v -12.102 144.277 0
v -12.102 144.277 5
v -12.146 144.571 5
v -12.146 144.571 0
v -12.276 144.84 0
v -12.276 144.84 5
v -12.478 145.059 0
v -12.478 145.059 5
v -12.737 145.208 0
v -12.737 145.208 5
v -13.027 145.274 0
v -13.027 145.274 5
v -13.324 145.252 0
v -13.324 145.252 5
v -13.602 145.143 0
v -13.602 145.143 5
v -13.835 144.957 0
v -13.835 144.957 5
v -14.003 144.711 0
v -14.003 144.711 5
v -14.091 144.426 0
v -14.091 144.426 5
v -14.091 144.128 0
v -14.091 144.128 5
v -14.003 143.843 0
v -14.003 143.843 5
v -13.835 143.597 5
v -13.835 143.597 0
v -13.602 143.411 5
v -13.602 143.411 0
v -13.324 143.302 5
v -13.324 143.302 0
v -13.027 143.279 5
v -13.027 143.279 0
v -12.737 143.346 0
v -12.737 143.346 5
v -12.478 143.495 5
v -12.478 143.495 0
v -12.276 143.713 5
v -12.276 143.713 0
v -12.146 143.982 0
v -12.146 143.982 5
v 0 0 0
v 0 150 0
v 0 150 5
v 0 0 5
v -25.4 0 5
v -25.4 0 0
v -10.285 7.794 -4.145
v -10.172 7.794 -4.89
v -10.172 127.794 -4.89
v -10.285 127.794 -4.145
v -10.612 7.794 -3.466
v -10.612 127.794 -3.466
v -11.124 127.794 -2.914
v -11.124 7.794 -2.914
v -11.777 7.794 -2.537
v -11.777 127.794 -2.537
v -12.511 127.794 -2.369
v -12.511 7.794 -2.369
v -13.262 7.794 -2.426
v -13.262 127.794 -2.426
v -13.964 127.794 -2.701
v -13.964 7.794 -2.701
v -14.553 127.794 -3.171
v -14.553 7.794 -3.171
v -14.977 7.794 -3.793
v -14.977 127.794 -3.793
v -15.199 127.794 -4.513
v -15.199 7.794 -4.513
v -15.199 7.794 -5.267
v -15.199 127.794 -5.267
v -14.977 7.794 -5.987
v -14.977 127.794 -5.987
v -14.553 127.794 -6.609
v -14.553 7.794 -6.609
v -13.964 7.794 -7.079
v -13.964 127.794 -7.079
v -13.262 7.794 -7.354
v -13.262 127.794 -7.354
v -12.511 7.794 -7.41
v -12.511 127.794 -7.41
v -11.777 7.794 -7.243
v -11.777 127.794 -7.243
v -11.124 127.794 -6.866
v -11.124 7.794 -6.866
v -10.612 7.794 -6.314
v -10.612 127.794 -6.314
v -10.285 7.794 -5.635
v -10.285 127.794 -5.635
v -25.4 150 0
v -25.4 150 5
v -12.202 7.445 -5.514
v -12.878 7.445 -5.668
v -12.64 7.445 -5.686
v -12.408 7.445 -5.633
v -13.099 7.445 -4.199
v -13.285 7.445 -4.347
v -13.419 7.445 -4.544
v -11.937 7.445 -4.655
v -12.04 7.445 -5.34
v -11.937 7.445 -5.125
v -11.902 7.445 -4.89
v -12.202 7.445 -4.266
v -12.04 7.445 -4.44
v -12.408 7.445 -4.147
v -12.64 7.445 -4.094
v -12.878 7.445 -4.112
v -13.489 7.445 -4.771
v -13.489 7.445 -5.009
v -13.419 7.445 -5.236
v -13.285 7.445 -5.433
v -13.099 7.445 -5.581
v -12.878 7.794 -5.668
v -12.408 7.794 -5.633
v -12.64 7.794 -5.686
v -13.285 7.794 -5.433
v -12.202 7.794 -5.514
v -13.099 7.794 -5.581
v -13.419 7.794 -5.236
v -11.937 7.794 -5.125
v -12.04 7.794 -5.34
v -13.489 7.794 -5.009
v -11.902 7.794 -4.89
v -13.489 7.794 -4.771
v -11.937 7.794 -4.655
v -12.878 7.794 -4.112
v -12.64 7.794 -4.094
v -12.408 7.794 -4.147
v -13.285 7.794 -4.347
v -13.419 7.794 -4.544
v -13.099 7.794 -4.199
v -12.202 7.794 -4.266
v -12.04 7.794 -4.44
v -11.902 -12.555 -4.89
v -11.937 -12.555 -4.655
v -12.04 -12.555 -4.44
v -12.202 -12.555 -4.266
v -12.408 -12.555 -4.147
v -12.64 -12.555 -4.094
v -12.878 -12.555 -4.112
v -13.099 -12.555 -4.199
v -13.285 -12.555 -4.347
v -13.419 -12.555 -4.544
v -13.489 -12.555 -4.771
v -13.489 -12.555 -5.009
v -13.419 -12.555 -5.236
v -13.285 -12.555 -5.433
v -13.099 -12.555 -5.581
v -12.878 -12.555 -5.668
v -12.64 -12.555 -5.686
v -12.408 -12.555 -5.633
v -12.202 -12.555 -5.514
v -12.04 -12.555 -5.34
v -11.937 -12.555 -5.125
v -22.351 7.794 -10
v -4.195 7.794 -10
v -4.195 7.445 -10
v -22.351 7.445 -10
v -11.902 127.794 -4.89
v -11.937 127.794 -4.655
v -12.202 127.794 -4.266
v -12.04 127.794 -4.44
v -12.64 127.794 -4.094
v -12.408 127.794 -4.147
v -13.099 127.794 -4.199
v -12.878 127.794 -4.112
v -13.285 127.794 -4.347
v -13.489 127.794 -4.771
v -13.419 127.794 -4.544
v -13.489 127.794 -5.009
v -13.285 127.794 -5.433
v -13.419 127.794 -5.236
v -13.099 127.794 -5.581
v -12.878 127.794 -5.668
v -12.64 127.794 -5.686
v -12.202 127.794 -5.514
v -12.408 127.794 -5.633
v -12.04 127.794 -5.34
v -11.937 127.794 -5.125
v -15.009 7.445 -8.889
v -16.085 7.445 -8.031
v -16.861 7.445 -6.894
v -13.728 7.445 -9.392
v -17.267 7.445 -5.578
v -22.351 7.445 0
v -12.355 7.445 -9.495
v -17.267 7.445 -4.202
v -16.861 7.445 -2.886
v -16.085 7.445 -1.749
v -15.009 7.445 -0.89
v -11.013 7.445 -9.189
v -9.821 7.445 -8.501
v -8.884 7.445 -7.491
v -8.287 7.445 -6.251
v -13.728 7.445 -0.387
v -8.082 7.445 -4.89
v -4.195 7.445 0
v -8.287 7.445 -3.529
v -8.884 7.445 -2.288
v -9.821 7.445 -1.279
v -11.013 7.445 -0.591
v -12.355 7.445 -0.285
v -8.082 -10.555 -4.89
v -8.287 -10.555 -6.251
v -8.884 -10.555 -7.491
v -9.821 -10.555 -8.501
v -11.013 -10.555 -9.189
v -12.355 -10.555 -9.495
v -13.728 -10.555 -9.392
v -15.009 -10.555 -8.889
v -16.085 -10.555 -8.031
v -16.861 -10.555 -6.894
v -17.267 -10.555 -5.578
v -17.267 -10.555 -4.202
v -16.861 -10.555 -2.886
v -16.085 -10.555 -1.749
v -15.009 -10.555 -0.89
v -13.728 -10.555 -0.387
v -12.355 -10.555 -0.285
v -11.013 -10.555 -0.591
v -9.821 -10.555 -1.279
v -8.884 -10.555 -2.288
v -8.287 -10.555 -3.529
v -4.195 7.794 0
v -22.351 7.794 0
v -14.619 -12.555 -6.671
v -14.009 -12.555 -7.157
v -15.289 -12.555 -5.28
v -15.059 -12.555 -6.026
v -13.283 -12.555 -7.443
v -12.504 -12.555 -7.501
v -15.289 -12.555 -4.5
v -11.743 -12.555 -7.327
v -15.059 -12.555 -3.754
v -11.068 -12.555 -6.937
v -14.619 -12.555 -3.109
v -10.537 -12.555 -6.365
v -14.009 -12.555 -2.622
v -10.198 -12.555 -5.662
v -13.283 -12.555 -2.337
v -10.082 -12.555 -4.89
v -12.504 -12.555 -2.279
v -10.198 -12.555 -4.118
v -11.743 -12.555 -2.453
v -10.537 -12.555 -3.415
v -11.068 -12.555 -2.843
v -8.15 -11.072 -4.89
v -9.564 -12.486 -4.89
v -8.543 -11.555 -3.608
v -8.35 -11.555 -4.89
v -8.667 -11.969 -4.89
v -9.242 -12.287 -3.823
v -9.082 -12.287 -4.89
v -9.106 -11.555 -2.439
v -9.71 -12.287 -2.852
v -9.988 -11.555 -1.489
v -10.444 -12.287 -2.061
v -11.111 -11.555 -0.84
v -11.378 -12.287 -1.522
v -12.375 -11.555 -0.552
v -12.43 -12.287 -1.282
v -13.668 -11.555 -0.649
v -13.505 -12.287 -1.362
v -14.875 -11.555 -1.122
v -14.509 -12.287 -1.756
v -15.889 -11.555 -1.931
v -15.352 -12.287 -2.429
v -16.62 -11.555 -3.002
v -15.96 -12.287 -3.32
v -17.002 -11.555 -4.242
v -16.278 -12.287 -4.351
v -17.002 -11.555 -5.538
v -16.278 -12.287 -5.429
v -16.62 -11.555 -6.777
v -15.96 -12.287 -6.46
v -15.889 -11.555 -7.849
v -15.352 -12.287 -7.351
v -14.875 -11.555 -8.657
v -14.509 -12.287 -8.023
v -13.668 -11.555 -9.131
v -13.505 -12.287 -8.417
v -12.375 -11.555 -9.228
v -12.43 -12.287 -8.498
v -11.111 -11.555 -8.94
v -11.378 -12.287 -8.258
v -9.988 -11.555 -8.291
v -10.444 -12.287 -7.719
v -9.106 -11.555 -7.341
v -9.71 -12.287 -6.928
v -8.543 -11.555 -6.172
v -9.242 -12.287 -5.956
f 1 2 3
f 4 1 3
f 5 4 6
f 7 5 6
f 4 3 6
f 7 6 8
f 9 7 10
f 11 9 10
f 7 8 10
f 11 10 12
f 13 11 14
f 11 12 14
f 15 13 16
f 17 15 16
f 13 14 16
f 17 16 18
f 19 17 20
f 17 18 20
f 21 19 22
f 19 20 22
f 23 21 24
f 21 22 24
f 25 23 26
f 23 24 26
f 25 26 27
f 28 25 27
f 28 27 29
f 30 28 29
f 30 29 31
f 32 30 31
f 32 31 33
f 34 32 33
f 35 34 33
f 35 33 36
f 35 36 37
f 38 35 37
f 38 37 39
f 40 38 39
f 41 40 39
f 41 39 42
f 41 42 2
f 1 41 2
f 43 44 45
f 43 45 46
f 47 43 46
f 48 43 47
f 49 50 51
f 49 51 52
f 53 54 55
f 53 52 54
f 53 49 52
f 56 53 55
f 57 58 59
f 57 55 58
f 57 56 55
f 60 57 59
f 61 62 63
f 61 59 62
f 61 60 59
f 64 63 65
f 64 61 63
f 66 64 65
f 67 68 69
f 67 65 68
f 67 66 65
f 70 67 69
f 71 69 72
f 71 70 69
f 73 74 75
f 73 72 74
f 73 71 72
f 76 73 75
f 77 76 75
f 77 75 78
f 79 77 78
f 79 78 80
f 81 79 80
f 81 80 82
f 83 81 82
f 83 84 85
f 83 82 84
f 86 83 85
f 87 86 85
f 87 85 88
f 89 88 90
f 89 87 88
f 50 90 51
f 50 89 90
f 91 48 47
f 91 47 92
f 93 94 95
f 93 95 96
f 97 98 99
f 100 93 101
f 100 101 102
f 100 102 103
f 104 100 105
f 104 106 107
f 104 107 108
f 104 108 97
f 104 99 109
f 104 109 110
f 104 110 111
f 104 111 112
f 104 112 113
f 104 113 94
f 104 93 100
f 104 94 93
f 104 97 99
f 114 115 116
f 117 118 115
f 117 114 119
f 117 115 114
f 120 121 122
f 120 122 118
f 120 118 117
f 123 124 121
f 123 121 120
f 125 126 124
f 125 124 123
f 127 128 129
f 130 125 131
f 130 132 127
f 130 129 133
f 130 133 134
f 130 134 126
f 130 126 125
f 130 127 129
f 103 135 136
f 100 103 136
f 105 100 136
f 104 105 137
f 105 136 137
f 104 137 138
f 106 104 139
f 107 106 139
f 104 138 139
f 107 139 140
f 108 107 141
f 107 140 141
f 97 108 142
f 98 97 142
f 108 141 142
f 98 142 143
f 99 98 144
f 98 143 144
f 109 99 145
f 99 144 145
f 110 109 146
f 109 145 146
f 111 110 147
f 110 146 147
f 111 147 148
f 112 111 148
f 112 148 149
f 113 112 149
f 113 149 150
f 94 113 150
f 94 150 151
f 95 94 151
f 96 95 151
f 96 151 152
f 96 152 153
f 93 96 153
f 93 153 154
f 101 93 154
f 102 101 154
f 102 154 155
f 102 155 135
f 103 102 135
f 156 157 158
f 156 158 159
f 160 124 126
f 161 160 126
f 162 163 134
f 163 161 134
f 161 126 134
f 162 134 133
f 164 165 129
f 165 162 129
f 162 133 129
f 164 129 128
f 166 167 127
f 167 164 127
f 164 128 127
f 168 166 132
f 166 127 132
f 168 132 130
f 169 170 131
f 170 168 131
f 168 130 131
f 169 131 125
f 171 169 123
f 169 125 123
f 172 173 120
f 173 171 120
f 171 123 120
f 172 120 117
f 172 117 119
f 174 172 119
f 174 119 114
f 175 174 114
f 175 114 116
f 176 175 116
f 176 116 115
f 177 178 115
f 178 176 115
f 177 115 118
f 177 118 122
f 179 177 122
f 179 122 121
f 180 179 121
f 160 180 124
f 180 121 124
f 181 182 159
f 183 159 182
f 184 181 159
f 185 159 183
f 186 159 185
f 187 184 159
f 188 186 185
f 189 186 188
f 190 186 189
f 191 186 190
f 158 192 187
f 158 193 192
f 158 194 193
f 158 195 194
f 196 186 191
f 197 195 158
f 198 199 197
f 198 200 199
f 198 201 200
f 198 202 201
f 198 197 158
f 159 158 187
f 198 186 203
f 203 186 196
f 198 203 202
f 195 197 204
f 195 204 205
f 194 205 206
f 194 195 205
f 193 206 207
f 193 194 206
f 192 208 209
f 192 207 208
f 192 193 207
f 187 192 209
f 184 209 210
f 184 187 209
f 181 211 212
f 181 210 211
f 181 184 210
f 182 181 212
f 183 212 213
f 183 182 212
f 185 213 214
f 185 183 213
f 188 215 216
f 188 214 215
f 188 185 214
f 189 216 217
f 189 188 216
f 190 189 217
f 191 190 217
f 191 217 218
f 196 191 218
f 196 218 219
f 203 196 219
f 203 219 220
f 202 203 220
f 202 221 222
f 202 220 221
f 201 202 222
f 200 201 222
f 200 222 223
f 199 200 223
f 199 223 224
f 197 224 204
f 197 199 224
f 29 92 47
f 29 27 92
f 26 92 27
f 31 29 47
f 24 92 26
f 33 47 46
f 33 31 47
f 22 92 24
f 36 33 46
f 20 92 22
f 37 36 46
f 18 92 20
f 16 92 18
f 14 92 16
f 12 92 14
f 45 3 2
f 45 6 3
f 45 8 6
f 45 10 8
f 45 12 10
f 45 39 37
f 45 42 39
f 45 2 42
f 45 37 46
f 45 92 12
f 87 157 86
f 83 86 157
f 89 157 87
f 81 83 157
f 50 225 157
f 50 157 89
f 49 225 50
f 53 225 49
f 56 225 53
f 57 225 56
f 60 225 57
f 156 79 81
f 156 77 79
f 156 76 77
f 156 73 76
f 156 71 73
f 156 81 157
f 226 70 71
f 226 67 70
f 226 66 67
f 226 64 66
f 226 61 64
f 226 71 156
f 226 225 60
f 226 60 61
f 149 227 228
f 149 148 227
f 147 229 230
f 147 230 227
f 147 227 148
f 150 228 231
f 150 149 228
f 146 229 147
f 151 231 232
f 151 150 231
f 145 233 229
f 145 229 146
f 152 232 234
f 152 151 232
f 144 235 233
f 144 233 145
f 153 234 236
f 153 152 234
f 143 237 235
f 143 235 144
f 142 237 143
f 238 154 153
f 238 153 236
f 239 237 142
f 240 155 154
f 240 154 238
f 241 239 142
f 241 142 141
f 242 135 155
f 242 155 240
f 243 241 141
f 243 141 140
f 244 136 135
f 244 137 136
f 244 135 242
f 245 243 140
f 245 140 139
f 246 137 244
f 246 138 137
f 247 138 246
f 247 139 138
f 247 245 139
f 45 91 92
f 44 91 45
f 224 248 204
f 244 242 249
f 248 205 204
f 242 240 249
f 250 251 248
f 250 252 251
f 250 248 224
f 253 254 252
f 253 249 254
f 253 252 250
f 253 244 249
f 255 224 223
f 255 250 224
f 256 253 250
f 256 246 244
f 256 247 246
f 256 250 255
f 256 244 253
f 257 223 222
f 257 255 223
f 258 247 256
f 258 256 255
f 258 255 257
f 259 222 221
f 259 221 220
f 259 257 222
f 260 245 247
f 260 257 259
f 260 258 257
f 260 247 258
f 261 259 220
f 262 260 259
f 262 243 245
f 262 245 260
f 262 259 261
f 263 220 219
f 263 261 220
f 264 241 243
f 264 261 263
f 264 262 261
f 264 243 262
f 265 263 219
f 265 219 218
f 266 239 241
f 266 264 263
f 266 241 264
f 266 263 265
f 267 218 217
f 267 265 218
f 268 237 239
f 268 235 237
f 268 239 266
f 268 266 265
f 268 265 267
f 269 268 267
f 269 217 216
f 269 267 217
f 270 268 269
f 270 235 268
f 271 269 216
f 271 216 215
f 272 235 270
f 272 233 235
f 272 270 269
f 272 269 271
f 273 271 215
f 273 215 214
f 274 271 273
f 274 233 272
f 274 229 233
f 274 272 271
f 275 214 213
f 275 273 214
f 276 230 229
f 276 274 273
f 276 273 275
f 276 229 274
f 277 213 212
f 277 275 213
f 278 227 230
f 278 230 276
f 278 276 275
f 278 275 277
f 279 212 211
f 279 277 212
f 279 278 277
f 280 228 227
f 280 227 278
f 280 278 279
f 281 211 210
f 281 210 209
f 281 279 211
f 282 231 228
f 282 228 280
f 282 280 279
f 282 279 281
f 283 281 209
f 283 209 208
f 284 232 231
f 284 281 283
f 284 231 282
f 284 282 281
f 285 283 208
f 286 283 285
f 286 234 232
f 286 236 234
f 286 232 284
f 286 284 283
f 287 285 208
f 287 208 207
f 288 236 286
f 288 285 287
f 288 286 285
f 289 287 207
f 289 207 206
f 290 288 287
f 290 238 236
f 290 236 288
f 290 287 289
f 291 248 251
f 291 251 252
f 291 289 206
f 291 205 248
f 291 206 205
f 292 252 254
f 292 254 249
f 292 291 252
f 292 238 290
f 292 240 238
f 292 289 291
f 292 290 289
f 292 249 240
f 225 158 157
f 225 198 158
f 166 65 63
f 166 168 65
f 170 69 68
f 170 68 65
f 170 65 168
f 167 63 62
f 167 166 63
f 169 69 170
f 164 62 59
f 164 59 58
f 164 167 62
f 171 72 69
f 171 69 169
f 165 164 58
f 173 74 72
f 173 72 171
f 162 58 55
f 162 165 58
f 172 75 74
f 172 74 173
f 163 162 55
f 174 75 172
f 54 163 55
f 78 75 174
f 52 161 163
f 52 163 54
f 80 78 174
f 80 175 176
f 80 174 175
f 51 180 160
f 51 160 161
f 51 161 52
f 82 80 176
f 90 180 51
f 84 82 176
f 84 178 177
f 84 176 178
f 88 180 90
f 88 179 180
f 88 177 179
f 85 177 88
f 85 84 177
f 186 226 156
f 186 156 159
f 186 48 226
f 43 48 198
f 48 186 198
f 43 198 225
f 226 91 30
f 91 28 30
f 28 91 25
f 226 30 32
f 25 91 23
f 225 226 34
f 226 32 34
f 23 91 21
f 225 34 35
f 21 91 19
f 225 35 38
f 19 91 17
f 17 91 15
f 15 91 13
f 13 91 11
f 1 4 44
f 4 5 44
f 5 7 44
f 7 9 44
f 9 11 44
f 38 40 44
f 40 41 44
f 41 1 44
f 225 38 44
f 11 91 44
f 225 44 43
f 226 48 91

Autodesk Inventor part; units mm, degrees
ref_plane "YZ Plane" through (0, 0, 0) normal (1, 0, 0) x (0, 1, 0)
ref_plane "XZ Plane" through (0, 0, 0) normal (0, 1, 0) x (-1, 0, 0)
ref_plane "XY Plane" through (0, 0, 0) normal (0, 0, 1) x (1, 0, 0)
sketch "Sketch1" plane through (0, 0, 0) normal (0, 0, 1) x (1, 0, 0)
  line L0 (0, 0) -> (-25.4, 0)
  line L1 (-25.4, 0) -> (-25.4, 150)
  line L2 (-25.4, 150) -> (0, 150)
  line L3 (0, 150) -> (0, 0)
  dimension "d0" = 25.4
  dimension "d1" = 150
extrude "Extrusion1" add sketch "Sketch1" along normal blind 5
sketch "Sketch2" plane through (0, 0, 0) normal (0, 0, -1) x (-1, 0, 0)
  point P0 (0, 0)
sketch "Sketch3" plane through (0, 0, 0) normal (0, 0, -1) x (-1, 0, 0)
  line L0 (4.1948, 7.7945) -> (22.3514, 7.7945)
  line L1 (22.3514, 7.7945) -> (22.3514, 7.4454)
  line L2 (22.3514, 7.4454) -> (4.1948, 7.4454)
  line L3 (4.1948, 7.4454) -> (4.1948, 7.7945)
  point P0 (0, 0)
extrude "Extrusion2" add sketch "Sketch3" along normal blind 10
sketch "Sketch4" plane through (-22.3514, 7.4454, 0) normal (0, -1, 0) x (1, 0, 0)
  circle A0 centre (9.6514, -4.8899) radius 4.6183
  point P0 (22.3514, 0)
extrude "Extrusion3" add sketch "Sketch4" along normal blind 20
fillet "Fillet1" radius 2 1 edges at (-17.3183, -12.5546, -4.8899)
sketch "Sketch5" plane through (-12.7, -12.5546, -4.8899) normal (0, -1, 0) x (1, 0, 0)
  circle A0 centre (0, 0) radius 2.6183 projected
  circle A1 centre (0, 0) radius 0.7983
  point P0 (12.7, 4.8899)
extrude "Extrusion4" cut sketch "Sketch5" against normal blind 20 contours A1
sketch "Sketch6" plane through (0, 0, 5) normal (0, 0, 1) x (1, 0, 0)
  circle A0 centre (-13.1019, 144.2767) radius 1
  point P0 (0, 0)
  dimension "d11" = 2
extrude "Extrusion5" cut sketch "Sketch6" against normal blind 20
sketch "Sketch7" plane through (-22.3514, 7.7945, 0) normal (0, 1, 0) x (1, 0, 0)
  circle A0 centre (9.6514, 4.8899) radius 0.7983 projected
  circle A1 centre (9.6514, 4.8899) radius 2.5276
  point P0 (22.3514, 0)
extrude "Extrusion6" add sketch "Sketch7" along normal blind 120
properties part number "spray"
